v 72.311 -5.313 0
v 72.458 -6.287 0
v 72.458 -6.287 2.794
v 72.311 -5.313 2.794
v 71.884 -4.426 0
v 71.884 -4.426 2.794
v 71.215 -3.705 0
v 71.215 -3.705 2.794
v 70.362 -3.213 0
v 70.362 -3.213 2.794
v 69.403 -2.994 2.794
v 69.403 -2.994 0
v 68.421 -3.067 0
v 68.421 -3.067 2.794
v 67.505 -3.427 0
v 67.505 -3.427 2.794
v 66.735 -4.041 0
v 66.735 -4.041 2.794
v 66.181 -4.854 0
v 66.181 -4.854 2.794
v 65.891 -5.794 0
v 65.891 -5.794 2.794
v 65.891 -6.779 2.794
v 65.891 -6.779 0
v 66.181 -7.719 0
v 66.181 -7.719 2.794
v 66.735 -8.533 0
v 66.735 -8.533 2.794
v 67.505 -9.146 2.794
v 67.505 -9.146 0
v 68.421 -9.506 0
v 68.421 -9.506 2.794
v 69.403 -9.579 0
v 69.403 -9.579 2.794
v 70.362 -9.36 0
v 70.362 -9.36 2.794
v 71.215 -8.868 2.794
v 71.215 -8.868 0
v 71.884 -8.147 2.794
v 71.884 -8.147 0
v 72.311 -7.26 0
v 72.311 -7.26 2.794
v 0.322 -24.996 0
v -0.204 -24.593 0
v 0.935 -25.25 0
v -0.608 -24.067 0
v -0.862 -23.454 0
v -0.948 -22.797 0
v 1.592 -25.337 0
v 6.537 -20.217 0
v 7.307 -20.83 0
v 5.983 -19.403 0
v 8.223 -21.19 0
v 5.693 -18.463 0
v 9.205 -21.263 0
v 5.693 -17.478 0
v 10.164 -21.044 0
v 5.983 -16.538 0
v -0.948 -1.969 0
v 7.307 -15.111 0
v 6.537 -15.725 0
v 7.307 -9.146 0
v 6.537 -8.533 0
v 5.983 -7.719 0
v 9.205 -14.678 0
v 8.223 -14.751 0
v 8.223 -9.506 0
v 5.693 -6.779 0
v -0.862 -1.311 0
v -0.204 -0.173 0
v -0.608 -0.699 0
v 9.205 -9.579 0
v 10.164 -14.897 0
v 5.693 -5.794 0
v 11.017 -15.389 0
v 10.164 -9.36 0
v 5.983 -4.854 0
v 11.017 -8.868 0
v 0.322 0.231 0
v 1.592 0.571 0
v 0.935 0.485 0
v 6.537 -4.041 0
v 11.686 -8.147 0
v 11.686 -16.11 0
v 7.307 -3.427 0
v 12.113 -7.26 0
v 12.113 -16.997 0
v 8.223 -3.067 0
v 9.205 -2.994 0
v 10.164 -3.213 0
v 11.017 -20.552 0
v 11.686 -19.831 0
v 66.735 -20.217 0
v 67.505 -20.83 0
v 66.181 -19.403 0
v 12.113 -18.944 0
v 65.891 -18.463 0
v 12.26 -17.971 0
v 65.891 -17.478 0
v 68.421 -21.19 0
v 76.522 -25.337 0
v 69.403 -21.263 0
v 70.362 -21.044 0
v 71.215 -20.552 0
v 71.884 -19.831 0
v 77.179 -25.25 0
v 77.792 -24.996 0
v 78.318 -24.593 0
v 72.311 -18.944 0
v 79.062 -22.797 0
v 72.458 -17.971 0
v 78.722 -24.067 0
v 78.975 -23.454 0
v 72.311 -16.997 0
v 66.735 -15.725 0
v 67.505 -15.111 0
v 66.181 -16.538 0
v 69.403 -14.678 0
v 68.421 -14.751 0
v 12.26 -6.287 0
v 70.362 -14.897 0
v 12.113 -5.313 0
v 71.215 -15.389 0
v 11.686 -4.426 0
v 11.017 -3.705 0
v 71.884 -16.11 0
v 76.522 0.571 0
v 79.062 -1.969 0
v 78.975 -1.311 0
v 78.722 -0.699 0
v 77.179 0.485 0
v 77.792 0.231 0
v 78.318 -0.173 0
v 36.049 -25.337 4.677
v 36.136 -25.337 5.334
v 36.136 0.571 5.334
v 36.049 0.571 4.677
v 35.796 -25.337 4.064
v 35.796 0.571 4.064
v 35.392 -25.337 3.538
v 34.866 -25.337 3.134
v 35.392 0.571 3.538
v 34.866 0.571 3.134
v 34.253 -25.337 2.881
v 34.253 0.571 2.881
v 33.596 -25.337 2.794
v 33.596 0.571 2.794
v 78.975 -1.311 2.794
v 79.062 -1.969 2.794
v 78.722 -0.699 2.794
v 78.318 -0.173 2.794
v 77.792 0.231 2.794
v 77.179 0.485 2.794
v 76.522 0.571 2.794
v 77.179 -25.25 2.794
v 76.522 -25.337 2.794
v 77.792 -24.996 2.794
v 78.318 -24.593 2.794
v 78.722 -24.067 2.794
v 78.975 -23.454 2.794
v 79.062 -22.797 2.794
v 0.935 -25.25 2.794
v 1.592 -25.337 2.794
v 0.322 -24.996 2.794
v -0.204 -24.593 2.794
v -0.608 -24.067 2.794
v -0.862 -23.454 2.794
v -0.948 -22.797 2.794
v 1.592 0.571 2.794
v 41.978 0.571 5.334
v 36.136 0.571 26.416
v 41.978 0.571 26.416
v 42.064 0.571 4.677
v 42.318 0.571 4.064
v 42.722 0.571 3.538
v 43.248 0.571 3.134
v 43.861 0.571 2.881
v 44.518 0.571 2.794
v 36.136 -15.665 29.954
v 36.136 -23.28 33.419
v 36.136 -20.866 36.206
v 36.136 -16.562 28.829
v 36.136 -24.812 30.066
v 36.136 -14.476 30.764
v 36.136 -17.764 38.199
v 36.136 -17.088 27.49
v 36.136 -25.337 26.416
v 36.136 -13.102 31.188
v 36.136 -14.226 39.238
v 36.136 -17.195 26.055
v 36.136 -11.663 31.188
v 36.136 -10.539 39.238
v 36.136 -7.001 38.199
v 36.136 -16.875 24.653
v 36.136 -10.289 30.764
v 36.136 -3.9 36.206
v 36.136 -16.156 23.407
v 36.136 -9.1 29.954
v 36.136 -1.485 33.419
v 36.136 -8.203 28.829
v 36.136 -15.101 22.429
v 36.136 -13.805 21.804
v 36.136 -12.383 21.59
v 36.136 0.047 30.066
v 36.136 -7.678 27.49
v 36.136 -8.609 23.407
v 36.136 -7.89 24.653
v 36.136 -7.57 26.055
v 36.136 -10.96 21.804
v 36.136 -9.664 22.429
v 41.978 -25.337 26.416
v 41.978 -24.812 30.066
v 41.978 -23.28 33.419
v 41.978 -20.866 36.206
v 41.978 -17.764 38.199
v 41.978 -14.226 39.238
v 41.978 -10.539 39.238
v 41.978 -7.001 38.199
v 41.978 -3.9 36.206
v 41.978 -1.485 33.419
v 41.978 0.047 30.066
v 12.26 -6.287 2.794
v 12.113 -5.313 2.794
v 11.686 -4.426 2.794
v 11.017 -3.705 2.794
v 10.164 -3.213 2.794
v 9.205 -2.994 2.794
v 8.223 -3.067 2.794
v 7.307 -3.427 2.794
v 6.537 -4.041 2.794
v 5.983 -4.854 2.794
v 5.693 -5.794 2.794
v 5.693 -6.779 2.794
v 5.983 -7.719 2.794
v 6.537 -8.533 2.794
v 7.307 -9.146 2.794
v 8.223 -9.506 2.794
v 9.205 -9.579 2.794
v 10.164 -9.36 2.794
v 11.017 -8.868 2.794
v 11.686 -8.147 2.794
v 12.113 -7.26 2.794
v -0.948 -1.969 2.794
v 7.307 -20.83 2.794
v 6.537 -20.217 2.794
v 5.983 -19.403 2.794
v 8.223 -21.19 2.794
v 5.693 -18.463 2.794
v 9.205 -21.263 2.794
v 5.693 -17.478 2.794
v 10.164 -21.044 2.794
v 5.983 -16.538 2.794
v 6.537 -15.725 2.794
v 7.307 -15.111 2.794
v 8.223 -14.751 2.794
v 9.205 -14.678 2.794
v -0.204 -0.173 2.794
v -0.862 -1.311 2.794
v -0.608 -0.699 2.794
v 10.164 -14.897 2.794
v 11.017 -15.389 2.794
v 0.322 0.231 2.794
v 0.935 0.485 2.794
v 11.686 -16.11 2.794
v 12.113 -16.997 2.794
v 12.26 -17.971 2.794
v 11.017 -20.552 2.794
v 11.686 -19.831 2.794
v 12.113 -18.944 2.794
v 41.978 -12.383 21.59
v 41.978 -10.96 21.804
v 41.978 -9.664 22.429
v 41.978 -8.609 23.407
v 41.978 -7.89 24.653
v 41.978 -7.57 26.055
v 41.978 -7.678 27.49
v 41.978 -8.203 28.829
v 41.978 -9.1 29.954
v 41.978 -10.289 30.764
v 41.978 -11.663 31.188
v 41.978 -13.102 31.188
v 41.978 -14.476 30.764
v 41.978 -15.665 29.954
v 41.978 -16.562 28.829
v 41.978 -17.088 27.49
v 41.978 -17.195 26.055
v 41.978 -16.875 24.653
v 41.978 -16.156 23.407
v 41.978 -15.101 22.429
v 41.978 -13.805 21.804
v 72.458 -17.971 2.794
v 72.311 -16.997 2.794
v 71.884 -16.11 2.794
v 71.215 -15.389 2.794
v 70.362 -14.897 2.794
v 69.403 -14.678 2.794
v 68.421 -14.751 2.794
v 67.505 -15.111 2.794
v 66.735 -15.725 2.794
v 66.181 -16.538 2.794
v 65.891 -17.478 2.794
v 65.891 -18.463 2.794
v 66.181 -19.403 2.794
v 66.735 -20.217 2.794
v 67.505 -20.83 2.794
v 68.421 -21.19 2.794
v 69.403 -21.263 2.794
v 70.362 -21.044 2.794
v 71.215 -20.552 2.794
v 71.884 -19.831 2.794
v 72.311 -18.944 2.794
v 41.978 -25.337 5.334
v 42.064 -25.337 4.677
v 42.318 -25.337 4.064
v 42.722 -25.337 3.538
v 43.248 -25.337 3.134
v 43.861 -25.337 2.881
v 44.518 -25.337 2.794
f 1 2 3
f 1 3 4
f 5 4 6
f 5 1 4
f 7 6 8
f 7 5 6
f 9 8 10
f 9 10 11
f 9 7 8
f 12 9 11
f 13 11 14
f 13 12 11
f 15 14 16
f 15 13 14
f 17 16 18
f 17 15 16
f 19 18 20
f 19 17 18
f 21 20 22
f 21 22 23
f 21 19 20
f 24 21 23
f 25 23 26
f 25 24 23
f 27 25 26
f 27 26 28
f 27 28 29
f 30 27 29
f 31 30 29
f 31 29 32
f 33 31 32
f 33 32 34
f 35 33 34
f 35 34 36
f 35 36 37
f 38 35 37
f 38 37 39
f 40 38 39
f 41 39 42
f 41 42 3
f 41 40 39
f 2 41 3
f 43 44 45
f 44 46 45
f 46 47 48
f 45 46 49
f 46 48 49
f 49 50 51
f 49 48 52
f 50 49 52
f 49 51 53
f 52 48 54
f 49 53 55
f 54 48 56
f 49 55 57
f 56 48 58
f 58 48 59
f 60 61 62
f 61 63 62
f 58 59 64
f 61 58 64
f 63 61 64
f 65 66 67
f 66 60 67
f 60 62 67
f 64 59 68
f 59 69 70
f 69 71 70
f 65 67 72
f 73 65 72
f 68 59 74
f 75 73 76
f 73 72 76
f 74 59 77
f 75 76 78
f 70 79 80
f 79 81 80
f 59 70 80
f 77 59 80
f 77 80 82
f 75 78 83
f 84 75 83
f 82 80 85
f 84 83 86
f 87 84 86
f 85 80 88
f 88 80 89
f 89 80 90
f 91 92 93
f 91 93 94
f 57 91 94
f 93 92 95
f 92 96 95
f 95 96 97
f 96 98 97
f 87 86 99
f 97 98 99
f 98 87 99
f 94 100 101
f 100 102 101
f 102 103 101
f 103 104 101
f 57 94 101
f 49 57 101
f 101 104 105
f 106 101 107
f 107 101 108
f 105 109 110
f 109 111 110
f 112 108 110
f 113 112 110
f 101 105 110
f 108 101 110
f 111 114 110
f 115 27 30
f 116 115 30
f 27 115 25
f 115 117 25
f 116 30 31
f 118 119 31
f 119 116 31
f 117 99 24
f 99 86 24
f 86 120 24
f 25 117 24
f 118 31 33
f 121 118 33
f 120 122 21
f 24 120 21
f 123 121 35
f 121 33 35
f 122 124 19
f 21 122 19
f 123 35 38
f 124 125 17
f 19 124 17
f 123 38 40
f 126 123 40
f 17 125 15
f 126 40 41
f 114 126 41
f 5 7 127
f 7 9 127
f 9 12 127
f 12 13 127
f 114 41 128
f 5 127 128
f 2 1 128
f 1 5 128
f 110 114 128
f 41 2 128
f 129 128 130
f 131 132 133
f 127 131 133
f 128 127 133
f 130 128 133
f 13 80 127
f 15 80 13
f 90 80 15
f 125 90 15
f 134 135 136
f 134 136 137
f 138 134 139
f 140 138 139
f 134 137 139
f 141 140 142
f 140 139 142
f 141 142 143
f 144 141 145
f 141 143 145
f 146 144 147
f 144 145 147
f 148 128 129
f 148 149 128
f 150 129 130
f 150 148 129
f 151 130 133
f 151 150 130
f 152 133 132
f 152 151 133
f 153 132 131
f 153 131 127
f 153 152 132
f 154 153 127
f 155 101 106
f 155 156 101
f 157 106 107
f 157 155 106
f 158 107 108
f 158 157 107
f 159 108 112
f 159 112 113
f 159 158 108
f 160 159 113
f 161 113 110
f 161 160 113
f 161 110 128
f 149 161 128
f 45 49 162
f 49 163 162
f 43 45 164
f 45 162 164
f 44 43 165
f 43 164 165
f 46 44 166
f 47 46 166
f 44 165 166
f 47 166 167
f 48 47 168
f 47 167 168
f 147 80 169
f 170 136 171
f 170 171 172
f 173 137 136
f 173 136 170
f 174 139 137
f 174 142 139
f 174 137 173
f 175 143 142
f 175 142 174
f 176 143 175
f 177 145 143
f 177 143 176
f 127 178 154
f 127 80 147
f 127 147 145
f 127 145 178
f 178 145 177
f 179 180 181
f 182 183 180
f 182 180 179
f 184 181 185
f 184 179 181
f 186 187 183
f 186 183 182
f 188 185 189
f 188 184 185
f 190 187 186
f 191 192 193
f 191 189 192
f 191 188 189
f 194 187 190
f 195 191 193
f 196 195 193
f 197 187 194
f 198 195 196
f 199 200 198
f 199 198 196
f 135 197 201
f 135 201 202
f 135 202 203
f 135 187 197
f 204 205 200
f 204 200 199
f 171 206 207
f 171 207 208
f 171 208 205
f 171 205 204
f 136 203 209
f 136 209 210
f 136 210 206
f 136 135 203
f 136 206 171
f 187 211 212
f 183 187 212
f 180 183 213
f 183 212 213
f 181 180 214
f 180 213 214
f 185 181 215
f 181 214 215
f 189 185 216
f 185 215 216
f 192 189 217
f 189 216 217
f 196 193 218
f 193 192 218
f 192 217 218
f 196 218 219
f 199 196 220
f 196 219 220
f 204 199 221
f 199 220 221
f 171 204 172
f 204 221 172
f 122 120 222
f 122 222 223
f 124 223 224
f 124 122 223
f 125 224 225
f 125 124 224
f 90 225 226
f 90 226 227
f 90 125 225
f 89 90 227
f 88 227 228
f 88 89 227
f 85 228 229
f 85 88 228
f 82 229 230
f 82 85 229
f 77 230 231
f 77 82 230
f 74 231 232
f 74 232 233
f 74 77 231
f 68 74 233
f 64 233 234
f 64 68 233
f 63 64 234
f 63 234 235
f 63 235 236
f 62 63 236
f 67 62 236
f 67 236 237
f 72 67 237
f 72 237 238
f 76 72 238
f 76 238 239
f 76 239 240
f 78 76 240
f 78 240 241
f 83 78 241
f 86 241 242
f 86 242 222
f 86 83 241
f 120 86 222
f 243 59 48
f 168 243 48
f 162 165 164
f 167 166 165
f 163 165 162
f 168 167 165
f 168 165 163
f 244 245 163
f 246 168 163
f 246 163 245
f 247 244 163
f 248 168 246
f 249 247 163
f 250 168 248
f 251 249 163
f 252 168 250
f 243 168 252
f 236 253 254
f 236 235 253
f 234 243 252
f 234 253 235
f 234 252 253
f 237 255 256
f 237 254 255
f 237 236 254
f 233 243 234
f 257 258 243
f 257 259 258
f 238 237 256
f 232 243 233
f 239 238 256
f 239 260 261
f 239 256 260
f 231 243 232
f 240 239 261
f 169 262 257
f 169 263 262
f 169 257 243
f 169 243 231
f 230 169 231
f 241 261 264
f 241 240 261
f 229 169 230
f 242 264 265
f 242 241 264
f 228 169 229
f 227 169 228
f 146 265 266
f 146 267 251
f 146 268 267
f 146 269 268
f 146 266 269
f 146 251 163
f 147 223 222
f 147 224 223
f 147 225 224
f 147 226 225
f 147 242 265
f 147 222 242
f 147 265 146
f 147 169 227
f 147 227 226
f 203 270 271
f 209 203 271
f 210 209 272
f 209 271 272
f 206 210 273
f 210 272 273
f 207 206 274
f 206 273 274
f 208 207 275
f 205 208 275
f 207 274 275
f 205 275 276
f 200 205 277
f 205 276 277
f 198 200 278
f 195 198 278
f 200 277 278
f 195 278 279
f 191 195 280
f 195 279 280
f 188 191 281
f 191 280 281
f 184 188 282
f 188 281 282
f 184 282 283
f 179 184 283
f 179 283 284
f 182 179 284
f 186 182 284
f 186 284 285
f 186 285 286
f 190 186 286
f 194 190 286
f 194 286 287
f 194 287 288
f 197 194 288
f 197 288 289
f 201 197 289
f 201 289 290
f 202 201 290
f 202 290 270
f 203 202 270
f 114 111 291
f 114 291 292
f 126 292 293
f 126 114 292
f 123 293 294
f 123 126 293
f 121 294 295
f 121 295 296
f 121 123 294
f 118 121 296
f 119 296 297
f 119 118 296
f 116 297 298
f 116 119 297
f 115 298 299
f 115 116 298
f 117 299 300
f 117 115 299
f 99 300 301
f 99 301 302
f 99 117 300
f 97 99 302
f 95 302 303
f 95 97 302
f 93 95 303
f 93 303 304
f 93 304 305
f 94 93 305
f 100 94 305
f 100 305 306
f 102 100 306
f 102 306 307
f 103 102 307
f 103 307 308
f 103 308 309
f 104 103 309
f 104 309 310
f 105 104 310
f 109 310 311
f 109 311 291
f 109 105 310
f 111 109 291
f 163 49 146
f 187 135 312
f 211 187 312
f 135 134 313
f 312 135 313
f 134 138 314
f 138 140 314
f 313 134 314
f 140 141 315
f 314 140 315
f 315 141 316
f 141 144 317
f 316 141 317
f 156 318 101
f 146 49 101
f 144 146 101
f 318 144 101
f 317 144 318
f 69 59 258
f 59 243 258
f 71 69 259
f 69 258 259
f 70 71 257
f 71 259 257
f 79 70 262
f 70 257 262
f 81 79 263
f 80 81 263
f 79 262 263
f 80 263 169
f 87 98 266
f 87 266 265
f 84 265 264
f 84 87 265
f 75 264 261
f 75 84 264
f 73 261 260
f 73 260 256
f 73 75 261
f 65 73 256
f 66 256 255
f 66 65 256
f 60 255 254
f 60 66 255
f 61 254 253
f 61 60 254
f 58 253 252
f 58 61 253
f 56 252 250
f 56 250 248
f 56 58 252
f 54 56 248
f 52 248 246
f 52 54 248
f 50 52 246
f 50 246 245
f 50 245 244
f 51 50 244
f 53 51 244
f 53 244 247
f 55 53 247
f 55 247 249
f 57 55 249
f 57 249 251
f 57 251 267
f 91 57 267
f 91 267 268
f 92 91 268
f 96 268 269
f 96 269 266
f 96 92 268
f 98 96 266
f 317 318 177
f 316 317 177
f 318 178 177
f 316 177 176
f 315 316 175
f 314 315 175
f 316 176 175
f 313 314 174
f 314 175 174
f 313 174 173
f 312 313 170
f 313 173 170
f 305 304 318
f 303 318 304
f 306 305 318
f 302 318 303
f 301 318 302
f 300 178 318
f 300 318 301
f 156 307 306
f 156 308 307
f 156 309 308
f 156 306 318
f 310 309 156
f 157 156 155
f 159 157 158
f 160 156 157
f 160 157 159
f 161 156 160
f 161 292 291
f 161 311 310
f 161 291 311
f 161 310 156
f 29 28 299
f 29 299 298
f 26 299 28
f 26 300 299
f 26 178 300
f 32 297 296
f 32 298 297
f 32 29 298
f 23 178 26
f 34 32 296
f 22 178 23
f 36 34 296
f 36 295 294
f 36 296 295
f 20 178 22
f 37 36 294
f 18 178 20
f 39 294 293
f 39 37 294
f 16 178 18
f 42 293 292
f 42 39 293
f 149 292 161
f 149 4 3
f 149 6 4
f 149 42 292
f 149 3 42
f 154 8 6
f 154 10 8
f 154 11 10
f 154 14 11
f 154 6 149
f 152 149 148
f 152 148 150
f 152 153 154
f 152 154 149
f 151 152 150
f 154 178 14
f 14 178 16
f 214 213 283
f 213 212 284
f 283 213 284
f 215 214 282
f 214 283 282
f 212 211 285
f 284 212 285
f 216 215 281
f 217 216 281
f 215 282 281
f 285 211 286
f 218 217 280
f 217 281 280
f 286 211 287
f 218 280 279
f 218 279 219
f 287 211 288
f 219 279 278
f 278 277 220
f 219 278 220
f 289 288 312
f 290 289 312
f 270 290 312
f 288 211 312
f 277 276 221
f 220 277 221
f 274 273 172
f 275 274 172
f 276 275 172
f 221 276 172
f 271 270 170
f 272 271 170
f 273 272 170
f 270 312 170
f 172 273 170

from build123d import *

# Parameters (mm, degrees)
SKETCH1_W             = 37.084
SKETCH1_H             = 25.908
SKETCH1_R             = 3.302
BOSS_EXTRUDE1_DEPTH   = 2.794
BOSS_EXTRUDE1_2_DEPTH = 2.794
SKETCH1_7_W           = 5.842
SKETCH1_7_H           = 25.908
BOSS_EXTRUDE2_DEPTH   = 39.624
FILLET1_R             = 2.54
SKETCH2_R             = 4.826
CUT_EXTRUDE4_DEPTH    = 39.624
CUT_EXTRUDE5_DEPTH    = 39.624
FILLET2_R             = 2.54


with BuildPart() as part:
    # Sketch1 → Boss-Extrude1 (new body)
    with BuildSketch(Plane.XY):
        with Locations((17.593948052, -12.382571429)):
            Rectangle(SKETCH1_W, SKETCH1_H)
        with Locations((8.957948052, -17.970571429)):
            Circle(SKETCH1_R, mode=Mode.SUBTRACT)
        with Locations((8.957948052, -6.286571429)):
            Circle(SKETCH1_R, mode=Mode.SUBTRACT)
    extrude(amount=BOSS_EXTRUDE1_DEPTH)



with BuildPart() as body_2:
    # Sketch1 → Boss-Extrude1 2 (new body)
    with BuildSketch(Plane.XY):
        with Locations((60.519948052, -12.382571429)):
            Rectangle(SKETCH1_W, SKETCH1_H)
        with Locations((69.155948052, -17.970571429)):
            Circle(SKETCH1_R, mode=Mode.SUBTRACT)
        with Locations((69.155948052, -6.286571429)):
            Circle(SKETCH1_R, mode=Mode.SUBTRACT)
    extrude(amount=BOSS_EXTRUDE1_2_DEPTH)


with BuildPart() as part_1:
    add(part.part)

    add(body_2.part)  # Boss-Extrude2 merges body 2
    # Sketch1<7> → Boss-Extrude2 (add)
    with BuildSketch(Plane.XY):
        with Locations((39.056948052, -12.382571429)):
            Rectangle(SKETCH1_7_W, SKETCH1_7_H)
    extrude(amount=BOSS_EXTRUDE2_DEPTH)

    # Fillet1
    fillet1_edges = [part_1.edges().sort_by_distance(p)[0] for p in [
        (79.061948052, 0.571428571, 1.397),
        (79.061948052, -25.336571429, 1.397),
        (-0.948051948, -25.336571429, 1.397),
        (-0.948051948, 0.571428571, 1.397),
    ]]
    fillet(fillet1_edges, radius=FILLET1_R)

    # Sketch2 → Cut-Extrude4 (cut)
    with BuildSketch(Plane(origin=(41.977948052, 0, 0), x_dir=(0, 0, -1), z_dir=(1, 0, 0))):
        with Locations((-26.416, -12.382571429)):
            Circle(SKETCH2_R)
    extrude(amount=-CUT_EXTRUDE4_DEPTH, mode=Mode.SUBTRACT)

    # Sketch2<11> → Cut-Extrude5 (cut)
    with BuildSketch(Plane(origin=(41.977948052, 0, 0), x_dir=(0, 0, -1), z_dir=(1, 0, 0))):
        with BuildLine():
            ThreePointArc((-26.416, -25.336571429), (-39.37, -12.382571429), (-26.416, 0.571428571))
            Line((-26.416, 0.571428571), (-39.624, 0.571428571))
            Line((-39.624, 0.571428571), (-39.624, -25.336571429))
            Line((-39.624, -25.336571429), (-26.416, -25.336571429))
        make_face()
    extrude(amount=-CUT_EXTRUDE5_DEPTH, mode=Mode.SUBTRACT)

    # Fillet2
    fillet2_edges = [part_1.edges().sort_by_distance(p)[0] for p in [
        (36.135948052, -12.382571429, 2.794),
        (41.977948052, -12.382571429, 2.794),
    ]]
    fillet(fillet2_edges, radius=FILLET2_R)


solid = part_1.part
